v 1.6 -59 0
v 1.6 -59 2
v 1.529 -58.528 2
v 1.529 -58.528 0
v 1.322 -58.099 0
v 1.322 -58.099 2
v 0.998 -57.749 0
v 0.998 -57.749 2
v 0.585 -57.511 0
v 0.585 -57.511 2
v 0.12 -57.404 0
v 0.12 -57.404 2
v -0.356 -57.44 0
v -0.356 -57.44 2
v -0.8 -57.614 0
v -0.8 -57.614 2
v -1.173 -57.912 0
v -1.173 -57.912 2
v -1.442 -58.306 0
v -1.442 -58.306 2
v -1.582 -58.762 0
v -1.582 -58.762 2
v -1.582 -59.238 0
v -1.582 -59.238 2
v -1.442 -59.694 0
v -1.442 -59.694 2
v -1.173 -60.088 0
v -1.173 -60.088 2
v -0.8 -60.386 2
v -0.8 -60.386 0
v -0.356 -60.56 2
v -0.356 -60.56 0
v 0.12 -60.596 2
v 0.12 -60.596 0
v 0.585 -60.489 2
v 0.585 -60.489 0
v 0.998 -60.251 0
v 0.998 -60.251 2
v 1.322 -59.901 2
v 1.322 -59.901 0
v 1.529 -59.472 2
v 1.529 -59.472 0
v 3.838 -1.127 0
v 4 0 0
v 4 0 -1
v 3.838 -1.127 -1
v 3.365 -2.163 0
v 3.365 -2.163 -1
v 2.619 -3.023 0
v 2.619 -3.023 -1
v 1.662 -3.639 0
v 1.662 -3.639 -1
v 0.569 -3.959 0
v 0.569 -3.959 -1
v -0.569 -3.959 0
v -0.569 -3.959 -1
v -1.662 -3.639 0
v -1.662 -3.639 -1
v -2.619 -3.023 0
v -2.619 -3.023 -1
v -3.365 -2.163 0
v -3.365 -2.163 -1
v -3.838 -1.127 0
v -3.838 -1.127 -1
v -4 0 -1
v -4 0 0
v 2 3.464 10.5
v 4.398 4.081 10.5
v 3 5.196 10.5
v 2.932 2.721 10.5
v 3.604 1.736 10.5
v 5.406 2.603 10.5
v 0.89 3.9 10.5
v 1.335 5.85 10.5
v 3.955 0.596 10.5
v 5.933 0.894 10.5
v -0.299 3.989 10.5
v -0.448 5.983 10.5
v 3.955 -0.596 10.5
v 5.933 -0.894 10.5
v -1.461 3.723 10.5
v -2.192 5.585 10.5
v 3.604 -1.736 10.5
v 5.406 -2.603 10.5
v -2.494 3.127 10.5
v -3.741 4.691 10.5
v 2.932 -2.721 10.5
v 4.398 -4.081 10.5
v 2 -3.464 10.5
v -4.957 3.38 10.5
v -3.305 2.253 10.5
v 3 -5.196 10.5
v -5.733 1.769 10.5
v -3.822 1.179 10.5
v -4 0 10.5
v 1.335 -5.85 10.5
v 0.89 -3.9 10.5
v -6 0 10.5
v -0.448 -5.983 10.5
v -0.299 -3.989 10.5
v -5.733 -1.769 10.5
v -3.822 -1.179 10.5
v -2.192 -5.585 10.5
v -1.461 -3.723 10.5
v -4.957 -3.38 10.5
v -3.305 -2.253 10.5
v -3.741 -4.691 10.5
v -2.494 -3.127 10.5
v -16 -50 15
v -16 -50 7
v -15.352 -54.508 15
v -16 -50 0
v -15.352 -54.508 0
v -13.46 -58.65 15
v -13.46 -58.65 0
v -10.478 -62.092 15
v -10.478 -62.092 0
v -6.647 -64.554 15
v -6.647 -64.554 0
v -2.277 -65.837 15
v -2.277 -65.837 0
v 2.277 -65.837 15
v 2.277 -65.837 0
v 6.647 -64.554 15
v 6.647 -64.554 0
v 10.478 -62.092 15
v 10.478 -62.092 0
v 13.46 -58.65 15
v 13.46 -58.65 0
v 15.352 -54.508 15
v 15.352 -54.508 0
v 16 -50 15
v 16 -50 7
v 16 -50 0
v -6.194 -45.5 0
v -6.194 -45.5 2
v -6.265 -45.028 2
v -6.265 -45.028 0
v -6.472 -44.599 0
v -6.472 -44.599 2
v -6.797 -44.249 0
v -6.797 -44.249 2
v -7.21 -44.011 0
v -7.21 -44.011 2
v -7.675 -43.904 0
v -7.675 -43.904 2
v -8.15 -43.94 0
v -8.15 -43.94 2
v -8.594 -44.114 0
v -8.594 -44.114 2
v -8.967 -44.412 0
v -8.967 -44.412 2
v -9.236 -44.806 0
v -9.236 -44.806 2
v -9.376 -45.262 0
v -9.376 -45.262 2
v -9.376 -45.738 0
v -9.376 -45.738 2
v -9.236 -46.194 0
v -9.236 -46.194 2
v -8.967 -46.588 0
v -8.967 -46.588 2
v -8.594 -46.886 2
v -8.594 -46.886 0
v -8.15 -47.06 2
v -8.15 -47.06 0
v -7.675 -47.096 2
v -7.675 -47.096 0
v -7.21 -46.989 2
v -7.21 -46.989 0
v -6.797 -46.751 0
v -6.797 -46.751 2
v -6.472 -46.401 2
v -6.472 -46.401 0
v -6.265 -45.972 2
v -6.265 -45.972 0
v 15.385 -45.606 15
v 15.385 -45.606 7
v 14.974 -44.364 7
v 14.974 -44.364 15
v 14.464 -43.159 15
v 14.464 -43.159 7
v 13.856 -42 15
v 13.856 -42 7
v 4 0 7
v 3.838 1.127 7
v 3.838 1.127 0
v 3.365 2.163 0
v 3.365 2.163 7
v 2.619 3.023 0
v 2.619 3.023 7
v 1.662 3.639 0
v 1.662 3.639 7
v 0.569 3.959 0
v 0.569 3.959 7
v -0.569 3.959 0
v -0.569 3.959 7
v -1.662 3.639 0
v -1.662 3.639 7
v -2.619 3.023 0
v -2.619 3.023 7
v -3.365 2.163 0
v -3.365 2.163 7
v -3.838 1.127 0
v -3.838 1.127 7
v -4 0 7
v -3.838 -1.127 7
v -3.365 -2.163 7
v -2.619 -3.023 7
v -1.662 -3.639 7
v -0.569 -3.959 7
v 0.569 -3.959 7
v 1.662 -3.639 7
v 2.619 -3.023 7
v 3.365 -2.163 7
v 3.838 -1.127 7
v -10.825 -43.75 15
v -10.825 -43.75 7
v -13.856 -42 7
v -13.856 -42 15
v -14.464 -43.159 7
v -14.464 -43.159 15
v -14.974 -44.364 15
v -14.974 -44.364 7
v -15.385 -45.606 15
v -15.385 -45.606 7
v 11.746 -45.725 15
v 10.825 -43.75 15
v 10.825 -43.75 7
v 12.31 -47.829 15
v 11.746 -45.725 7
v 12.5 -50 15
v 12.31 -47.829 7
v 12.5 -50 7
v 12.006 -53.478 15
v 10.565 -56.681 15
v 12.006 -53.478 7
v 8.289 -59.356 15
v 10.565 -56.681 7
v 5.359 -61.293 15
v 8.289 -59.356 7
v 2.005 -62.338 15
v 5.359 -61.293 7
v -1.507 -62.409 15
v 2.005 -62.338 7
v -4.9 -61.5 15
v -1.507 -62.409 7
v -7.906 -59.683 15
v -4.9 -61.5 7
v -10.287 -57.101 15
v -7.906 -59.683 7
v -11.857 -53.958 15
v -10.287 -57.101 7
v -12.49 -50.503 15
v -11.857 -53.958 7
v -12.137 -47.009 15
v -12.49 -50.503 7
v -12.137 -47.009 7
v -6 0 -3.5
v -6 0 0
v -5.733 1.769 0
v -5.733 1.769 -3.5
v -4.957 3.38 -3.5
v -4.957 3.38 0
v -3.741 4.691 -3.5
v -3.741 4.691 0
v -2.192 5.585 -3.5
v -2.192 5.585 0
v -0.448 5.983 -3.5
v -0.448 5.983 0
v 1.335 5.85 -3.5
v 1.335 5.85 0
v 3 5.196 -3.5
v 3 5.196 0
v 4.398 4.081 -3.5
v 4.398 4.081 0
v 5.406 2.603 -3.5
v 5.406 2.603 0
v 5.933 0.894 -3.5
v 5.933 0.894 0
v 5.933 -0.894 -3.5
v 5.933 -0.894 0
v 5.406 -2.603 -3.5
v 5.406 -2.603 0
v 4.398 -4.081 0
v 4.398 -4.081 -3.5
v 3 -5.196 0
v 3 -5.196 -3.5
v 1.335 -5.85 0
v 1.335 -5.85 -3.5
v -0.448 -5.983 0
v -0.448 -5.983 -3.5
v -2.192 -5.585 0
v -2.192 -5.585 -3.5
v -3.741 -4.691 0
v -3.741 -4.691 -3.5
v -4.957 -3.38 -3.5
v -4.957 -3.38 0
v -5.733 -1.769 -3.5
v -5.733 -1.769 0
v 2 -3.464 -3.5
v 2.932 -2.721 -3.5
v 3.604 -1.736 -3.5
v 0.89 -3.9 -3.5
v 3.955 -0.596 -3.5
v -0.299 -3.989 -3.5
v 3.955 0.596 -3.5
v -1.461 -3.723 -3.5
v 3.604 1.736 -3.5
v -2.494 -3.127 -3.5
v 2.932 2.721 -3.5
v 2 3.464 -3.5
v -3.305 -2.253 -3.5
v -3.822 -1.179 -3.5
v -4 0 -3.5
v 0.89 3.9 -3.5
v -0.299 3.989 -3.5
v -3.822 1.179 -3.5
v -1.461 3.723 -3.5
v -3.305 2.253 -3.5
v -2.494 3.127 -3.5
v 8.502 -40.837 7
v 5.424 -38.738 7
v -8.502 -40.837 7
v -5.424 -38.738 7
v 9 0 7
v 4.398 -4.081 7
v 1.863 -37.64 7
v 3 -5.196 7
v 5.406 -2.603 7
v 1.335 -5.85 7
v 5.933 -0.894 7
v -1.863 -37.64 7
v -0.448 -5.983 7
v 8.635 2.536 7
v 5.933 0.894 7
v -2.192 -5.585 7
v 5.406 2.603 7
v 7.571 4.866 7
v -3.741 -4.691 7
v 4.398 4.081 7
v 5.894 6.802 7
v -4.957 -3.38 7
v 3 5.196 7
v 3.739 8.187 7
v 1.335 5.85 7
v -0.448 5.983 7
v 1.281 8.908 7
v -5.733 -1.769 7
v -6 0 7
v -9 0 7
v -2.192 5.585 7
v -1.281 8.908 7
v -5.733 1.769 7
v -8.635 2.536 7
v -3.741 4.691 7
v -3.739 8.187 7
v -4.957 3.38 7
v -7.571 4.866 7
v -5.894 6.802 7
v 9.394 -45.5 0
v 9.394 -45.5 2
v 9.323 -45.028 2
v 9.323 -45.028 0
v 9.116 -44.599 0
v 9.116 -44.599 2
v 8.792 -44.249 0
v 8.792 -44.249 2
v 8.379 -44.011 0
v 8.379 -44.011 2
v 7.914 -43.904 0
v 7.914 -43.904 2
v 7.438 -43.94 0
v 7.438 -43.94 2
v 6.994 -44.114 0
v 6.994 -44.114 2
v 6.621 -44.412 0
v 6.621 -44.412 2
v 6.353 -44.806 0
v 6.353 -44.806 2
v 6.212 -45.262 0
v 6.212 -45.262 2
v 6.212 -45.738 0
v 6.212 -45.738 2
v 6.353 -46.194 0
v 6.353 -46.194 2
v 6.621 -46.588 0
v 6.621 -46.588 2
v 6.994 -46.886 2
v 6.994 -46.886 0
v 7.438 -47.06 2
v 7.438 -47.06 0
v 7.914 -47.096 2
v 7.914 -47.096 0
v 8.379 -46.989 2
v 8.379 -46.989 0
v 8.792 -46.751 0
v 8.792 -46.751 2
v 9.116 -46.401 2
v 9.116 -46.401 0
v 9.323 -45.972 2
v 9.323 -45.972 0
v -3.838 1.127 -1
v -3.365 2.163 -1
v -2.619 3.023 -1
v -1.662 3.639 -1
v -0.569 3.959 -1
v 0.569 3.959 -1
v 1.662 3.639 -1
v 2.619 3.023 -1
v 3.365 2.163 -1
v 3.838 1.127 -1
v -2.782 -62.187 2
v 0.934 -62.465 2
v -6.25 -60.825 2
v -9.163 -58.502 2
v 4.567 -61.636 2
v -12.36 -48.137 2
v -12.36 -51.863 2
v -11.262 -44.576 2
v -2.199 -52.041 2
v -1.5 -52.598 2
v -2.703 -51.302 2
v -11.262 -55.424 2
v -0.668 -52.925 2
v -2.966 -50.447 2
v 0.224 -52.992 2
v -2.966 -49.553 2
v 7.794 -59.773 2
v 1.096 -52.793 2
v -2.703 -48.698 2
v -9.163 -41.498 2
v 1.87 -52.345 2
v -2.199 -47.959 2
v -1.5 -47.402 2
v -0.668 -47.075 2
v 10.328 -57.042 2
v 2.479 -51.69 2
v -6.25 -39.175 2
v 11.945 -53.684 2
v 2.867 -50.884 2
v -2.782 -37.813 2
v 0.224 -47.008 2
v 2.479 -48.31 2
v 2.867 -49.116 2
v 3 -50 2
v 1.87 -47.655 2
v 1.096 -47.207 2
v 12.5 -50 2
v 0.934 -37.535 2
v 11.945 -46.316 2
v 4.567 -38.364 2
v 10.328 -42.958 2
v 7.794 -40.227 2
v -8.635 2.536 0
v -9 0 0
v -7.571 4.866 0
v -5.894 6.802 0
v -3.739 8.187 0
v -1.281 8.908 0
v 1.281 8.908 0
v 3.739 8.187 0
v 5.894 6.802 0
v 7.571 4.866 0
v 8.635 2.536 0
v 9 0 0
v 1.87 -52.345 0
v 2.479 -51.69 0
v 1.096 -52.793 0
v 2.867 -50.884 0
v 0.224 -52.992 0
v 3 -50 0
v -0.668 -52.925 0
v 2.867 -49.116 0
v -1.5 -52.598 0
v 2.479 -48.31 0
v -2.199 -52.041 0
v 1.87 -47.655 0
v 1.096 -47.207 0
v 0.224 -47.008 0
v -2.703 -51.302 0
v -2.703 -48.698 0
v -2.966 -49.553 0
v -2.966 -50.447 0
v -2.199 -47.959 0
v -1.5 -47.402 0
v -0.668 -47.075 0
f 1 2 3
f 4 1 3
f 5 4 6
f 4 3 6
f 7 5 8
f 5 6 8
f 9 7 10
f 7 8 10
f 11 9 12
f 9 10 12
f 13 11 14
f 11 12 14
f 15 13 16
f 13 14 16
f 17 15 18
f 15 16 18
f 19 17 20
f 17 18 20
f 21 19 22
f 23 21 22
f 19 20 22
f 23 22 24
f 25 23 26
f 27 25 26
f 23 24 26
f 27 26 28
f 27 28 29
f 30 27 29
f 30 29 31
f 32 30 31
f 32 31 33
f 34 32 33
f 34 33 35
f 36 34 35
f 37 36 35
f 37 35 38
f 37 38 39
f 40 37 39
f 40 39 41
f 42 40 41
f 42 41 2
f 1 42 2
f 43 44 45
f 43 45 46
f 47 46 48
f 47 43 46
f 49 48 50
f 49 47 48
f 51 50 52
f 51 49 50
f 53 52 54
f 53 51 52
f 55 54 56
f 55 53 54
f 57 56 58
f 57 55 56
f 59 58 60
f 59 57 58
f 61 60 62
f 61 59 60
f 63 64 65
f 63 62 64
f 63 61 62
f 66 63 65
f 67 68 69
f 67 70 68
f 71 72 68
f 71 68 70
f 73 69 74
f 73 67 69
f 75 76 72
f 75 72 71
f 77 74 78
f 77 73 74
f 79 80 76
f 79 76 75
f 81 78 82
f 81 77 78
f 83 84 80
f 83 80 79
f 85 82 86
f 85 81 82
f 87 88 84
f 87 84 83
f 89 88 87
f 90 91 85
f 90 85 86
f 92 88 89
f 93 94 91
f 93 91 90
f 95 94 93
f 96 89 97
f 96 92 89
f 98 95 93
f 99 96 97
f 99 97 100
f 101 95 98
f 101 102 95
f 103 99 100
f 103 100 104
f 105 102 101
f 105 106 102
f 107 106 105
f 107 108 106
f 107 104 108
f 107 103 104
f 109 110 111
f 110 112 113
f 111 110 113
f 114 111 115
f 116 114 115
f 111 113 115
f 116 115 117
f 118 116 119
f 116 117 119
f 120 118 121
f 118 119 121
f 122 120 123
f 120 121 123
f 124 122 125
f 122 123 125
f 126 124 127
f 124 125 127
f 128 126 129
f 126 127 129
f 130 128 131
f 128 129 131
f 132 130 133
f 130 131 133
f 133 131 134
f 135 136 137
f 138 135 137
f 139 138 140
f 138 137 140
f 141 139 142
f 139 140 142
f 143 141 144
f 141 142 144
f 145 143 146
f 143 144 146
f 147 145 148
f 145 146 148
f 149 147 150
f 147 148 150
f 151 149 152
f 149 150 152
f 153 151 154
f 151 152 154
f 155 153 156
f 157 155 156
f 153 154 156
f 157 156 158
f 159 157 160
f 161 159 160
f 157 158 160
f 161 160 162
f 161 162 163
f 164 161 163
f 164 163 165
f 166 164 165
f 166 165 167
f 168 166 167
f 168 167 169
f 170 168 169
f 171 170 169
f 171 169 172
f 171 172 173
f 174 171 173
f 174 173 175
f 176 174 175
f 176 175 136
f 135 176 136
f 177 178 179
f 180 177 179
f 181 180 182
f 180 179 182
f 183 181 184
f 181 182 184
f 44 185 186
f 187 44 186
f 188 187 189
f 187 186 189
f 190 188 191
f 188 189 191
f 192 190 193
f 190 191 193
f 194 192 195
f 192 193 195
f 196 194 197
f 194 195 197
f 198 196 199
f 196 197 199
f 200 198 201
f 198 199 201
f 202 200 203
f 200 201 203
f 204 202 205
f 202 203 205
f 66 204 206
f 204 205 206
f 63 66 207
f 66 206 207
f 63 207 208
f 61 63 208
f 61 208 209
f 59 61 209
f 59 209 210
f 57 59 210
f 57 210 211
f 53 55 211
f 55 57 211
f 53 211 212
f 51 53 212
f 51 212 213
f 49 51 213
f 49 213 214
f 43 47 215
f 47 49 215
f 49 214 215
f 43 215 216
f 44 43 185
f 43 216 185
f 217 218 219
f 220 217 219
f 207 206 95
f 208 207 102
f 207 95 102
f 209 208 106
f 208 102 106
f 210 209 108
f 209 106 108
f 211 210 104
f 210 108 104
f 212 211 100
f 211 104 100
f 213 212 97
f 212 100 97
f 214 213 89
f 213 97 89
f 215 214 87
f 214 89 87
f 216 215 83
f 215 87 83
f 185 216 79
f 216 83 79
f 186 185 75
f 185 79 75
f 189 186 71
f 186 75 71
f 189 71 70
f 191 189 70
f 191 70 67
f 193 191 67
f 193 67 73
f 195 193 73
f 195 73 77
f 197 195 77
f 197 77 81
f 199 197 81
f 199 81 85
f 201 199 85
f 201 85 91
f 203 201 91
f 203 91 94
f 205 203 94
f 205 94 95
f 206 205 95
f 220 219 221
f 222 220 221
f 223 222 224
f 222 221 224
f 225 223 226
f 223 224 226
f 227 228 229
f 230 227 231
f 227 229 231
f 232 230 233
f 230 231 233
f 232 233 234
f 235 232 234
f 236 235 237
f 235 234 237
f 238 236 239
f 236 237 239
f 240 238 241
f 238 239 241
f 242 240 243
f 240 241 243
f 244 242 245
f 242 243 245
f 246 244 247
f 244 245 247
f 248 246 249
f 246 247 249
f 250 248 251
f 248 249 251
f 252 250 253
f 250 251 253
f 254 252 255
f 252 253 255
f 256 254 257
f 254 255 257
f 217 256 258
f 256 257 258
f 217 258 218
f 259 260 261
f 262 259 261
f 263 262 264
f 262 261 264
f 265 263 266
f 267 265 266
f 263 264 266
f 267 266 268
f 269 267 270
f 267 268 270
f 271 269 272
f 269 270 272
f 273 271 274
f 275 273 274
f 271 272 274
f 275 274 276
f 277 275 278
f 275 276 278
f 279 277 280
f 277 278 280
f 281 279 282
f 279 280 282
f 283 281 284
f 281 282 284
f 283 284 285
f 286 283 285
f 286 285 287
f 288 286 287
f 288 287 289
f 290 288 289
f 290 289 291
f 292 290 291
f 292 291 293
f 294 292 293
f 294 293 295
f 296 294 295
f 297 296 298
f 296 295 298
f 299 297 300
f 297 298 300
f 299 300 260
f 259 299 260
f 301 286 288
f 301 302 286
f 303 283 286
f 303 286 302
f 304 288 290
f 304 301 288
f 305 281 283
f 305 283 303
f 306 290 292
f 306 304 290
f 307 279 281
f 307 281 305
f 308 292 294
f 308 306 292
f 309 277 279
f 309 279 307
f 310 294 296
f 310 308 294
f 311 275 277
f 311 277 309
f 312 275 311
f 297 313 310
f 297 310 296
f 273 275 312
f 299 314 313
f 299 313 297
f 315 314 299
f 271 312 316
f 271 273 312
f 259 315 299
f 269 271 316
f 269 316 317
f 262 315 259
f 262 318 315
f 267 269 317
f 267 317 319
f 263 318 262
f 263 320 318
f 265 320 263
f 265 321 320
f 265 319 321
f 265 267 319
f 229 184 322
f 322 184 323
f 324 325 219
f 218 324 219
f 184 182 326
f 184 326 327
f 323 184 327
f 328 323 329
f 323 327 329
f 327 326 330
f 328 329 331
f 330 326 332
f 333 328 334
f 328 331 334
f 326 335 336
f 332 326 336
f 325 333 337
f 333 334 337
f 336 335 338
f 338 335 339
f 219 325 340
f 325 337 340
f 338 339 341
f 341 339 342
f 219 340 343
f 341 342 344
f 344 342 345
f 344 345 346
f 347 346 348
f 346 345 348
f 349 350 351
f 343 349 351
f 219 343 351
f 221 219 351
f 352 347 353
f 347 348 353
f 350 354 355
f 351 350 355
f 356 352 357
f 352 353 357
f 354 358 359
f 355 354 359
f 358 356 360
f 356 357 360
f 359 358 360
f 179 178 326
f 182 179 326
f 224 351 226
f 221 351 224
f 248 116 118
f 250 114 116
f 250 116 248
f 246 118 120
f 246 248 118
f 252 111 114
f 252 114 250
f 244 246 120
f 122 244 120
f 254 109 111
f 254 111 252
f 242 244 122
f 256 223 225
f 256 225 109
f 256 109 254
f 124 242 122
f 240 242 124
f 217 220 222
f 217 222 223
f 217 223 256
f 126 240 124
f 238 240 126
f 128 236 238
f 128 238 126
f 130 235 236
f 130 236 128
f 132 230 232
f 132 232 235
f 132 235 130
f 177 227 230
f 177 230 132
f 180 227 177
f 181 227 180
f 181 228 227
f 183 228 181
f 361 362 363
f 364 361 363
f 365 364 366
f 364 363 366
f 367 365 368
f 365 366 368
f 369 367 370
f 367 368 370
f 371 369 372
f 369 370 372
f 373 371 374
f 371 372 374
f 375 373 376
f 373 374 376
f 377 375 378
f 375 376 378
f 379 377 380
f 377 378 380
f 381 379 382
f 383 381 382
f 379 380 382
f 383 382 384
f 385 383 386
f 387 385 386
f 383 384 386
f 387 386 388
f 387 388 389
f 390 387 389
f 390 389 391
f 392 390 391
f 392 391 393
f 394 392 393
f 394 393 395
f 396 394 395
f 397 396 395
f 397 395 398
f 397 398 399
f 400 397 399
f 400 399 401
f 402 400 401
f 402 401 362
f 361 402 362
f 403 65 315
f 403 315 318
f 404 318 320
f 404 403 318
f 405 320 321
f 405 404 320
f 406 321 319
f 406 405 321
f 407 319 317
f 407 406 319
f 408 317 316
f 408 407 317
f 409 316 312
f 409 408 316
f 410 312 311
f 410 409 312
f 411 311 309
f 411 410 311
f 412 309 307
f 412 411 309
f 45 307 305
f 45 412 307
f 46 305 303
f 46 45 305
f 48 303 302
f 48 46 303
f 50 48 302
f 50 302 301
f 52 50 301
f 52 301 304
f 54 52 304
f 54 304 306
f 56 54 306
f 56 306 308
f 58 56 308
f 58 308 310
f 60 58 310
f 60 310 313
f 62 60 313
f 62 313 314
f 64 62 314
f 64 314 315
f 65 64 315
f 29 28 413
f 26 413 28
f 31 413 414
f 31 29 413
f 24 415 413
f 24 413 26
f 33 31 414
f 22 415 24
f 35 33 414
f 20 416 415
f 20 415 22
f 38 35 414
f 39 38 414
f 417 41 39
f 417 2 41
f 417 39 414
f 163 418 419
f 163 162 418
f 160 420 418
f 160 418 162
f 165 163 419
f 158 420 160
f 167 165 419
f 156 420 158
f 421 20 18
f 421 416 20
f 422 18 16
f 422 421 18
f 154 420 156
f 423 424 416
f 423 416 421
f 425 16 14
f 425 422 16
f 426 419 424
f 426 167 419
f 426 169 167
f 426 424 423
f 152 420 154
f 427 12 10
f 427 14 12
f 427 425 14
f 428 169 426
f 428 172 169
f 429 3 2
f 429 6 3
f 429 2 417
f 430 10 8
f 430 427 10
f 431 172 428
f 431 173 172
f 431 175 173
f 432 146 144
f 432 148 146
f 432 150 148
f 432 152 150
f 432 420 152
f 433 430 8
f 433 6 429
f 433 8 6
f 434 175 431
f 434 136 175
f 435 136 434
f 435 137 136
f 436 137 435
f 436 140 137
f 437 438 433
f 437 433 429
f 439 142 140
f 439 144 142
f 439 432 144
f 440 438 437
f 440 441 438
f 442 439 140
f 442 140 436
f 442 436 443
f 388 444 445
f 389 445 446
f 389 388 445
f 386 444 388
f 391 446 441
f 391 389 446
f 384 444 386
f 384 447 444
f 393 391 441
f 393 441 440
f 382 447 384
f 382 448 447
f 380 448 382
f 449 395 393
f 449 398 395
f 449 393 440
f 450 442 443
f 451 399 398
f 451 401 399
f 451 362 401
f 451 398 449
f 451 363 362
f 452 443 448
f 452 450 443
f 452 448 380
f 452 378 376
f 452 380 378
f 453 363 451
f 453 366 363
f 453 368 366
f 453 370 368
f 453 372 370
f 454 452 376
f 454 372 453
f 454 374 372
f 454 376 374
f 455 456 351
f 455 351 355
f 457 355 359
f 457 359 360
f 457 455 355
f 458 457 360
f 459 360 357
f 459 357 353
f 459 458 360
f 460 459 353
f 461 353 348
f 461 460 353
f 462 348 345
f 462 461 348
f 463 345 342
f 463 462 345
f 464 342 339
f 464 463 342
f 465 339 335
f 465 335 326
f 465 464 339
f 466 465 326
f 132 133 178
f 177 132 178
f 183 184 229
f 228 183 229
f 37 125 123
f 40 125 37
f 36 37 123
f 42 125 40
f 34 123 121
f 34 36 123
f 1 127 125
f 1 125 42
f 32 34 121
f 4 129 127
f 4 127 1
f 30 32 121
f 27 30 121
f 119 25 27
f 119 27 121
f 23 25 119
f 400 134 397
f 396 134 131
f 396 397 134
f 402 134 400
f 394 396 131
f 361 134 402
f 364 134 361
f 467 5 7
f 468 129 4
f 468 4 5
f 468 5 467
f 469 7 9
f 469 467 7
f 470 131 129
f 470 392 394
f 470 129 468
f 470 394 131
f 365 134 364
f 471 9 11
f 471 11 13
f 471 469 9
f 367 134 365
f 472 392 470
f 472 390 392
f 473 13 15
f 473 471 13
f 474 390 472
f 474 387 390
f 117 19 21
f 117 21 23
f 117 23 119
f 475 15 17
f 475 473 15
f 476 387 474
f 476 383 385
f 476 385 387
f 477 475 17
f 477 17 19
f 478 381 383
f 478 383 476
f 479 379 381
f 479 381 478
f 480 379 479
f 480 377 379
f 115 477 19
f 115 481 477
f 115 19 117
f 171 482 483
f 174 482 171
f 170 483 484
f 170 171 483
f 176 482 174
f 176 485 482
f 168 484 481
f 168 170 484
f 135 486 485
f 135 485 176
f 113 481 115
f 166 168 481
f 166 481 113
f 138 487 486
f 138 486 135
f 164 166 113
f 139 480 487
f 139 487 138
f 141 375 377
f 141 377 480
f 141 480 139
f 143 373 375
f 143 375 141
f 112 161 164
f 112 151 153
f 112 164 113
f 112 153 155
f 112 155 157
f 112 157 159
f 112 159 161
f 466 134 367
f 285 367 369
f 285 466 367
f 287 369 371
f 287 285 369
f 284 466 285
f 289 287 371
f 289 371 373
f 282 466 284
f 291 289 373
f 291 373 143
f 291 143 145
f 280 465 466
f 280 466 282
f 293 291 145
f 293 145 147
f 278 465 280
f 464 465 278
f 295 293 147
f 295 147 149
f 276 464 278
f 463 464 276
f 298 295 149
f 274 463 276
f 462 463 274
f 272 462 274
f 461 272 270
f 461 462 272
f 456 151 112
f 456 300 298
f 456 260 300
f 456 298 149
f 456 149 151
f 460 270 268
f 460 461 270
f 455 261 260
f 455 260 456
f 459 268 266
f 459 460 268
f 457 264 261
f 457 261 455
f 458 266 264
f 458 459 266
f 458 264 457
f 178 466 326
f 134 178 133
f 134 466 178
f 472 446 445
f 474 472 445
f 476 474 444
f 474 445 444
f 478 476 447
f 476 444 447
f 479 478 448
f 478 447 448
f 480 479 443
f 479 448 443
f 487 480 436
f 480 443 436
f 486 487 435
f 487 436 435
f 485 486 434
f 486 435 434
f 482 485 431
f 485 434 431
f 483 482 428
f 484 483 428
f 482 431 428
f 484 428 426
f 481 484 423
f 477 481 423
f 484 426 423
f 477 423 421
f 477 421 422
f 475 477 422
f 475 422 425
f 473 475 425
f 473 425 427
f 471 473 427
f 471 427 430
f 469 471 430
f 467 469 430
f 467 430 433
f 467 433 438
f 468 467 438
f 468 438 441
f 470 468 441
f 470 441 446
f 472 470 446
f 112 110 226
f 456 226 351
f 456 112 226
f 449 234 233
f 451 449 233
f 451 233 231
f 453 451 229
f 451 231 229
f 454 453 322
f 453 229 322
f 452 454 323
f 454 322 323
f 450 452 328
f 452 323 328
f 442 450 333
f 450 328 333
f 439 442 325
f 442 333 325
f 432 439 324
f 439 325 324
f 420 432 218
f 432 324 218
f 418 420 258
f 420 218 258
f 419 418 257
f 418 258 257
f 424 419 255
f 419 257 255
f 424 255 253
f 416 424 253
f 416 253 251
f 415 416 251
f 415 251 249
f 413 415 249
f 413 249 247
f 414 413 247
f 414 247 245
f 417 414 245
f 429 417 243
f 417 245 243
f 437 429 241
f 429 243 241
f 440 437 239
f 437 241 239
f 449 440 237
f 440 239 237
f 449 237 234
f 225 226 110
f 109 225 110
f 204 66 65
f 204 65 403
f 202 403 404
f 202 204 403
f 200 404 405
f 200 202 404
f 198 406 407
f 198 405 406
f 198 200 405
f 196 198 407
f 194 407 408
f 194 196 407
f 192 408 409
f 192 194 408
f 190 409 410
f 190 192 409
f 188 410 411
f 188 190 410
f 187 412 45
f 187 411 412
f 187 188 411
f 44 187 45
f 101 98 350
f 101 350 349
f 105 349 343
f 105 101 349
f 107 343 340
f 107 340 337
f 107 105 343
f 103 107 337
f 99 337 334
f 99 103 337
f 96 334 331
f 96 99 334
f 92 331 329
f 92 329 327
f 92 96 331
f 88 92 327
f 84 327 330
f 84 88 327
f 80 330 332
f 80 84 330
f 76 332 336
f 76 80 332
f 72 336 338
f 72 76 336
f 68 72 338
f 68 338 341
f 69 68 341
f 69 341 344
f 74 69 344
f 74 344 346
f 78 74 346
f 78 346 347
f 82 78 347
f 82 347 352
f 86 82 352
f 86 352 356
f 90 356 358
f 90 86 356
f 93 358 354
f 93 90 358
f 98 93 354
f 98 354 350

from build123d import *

# Parameters (mm, degrees)
BOSS_EXTRU_1_DEPTH      = 7
ESQUISSE2_R             = 3
ENL_V_MAT_EXTRU_1_DEPTH = 7
ESQUISSE3_R             = 1.6
ENL_V_MAT_EXTRU_2_DEPTH = 7
ESQUISSE5_R             = 12.5
ENL_V_MAT_EXTRU_5_DEPTH = 5
ESQUISSE16_R            = 6
ESQUISSE16_R_2          = 4
BOSS_EXTRU_5_DEPTH      = 3.5
BOSS_EXTRU_6_START      = 3.5
ESQUISSE17_R            = 6
ESQUISSE17_R_2          = 4
BOSS_EXTRU_6_DEPTH      = 3.5
BOSS_EXTRU_8_DEPTH      = 8
ESQUISSE19_R            = 4
ENL_V_MAT_EXTRU_6_DEPTH = 8


with BuildPart() as part:
    # Esquisse1 → Boss.-Extru.1 (new body)
    with BuildSketch(Plane.XY):
        with BuildLine():
            Line((9, 0), (16, -50))
            ThreePointArc((16, -50), (0, -66), (-16, -50))
            Line((-16, -50), (-9, 0))
            ThreePointArc((-9, 0), (0, 9), (9, 0))
        make_face()
    extrude(amount=BOSS_EXTRU_1_DEPTH)

    # Esquisse2 → Enlèv. mat.-Extru.1 (cut)
    with BuildSketch(Plane.XY.offset(7)):
        with Locations((0, -50)):
            Circle(ESQUISSE2_R)
    extrude(amount=-ENL_V_MAT_EXTRU_1_DEPTH, mode=Mode.SUBTRACT)

    # Esquisse3 → Enlèv. mat.-Extru.2 (cut)
    with BuildSketch(Plane.XY.offset(7)):
        with Locations((0, -59)):
            Circle(ESQUISSE3_R)
        with Locations((-7.794228634, -45.5)):
            Circle(ESQUISSE3_R)
        with Locations((7.794228634, -45.5)):
            Circle(ESQUISSE3_R)
    extrude(amount=-ENL_V_MAT_EXTRU_2_DEPTH, mode=Mode.SUBTRACT)

    # Esquisse5 → Enlèv. mat.-Extru.5 (cut)
    with BuildSketch(Plane.XY.offset(7)):
        with Locations((0, -50)):
            Circle(ESQUISSE5_R)
    extrude(amount=-ENL_V_MAT_EXTRU_5_DEPTH, mode=Mode.SUBTRACT)

    # Esquisse16 → Boss.-Extru.5 (add)
    with BuildSketch(Plane(origin=(0, 0, 0), x_dir=(-1, 0, 0), z_dir=(0, 0, -1))):
        Circle(ESQUISSE16_R)
        Circle(ESQUISSE16_R_2, mode=Mode.SUBTRACT)
    extrude(amount=BOSS_EXTRU_5_DEPTH)

    # Esquisse17 → Boss.-Extru.6 (add)
    with BuildSketch(Plane.XY.offset(7).offset(BOSS_EXTRU_6_START)):
        with Locations(Location((0, 0, 0), (0, 0, 180))):
            Circle(ESQUISSE17_R)
        with Locations(Location((0, 0, 0), (0, 0, 180))):
            Circle(ESQUISSE17_R_2, mode=Mode.SUBTRACT)
    extrude(amount=-BOSS_EXTRU_6_DEPTH)

    # Esquisse18 → Boss.-Extru.8 (add)
    with BuildSketch(Plane.XY.offset(7)):
        with BuildLine():
            Line((-10.825317547, -43.75), (-13.856406461, -42))
            ThreePointArc((-13.856406461, -42), (-14.731391476, -43.756114576), (-15.384856807, -45.606120047))
            Line((-15.384856807, -45.606120047), (-16, -50))
            ThreePointArc((-16, -50), (0, -66), (16, -50))
            Line((16, -50), (15.384856807, -45.606120047))
            ThreePointArc((15.384856807, -45.606120047), (14.731391476, -43.756114576), (13.856406461, -42))
            Line((13.856406461, -42), (10.825317547, -43.75))
            ThreePointArc((10.825317547, -43.75), (12.074072829, -46.764761936), (12.5, -50))
            ThreePointArc((12.5, -50), (-3.235238064, -62.074072829), (-10.825317547, -43.75))
        make_face()
    extrude(amount=BOSS_EXTRU_8_DEPTH)

    # Esquisse19 → Enlèv. mat.-Extru.6 (cut)
    with BuildSketch(Plane.XY.offset(7)):
        Circle(ESQUISSE19_R)
    extrude(amount=-ENL_V_MAT_EXTRU_6_DEPTH, mode=Mode.SUBTRACT)


solid = part.part
